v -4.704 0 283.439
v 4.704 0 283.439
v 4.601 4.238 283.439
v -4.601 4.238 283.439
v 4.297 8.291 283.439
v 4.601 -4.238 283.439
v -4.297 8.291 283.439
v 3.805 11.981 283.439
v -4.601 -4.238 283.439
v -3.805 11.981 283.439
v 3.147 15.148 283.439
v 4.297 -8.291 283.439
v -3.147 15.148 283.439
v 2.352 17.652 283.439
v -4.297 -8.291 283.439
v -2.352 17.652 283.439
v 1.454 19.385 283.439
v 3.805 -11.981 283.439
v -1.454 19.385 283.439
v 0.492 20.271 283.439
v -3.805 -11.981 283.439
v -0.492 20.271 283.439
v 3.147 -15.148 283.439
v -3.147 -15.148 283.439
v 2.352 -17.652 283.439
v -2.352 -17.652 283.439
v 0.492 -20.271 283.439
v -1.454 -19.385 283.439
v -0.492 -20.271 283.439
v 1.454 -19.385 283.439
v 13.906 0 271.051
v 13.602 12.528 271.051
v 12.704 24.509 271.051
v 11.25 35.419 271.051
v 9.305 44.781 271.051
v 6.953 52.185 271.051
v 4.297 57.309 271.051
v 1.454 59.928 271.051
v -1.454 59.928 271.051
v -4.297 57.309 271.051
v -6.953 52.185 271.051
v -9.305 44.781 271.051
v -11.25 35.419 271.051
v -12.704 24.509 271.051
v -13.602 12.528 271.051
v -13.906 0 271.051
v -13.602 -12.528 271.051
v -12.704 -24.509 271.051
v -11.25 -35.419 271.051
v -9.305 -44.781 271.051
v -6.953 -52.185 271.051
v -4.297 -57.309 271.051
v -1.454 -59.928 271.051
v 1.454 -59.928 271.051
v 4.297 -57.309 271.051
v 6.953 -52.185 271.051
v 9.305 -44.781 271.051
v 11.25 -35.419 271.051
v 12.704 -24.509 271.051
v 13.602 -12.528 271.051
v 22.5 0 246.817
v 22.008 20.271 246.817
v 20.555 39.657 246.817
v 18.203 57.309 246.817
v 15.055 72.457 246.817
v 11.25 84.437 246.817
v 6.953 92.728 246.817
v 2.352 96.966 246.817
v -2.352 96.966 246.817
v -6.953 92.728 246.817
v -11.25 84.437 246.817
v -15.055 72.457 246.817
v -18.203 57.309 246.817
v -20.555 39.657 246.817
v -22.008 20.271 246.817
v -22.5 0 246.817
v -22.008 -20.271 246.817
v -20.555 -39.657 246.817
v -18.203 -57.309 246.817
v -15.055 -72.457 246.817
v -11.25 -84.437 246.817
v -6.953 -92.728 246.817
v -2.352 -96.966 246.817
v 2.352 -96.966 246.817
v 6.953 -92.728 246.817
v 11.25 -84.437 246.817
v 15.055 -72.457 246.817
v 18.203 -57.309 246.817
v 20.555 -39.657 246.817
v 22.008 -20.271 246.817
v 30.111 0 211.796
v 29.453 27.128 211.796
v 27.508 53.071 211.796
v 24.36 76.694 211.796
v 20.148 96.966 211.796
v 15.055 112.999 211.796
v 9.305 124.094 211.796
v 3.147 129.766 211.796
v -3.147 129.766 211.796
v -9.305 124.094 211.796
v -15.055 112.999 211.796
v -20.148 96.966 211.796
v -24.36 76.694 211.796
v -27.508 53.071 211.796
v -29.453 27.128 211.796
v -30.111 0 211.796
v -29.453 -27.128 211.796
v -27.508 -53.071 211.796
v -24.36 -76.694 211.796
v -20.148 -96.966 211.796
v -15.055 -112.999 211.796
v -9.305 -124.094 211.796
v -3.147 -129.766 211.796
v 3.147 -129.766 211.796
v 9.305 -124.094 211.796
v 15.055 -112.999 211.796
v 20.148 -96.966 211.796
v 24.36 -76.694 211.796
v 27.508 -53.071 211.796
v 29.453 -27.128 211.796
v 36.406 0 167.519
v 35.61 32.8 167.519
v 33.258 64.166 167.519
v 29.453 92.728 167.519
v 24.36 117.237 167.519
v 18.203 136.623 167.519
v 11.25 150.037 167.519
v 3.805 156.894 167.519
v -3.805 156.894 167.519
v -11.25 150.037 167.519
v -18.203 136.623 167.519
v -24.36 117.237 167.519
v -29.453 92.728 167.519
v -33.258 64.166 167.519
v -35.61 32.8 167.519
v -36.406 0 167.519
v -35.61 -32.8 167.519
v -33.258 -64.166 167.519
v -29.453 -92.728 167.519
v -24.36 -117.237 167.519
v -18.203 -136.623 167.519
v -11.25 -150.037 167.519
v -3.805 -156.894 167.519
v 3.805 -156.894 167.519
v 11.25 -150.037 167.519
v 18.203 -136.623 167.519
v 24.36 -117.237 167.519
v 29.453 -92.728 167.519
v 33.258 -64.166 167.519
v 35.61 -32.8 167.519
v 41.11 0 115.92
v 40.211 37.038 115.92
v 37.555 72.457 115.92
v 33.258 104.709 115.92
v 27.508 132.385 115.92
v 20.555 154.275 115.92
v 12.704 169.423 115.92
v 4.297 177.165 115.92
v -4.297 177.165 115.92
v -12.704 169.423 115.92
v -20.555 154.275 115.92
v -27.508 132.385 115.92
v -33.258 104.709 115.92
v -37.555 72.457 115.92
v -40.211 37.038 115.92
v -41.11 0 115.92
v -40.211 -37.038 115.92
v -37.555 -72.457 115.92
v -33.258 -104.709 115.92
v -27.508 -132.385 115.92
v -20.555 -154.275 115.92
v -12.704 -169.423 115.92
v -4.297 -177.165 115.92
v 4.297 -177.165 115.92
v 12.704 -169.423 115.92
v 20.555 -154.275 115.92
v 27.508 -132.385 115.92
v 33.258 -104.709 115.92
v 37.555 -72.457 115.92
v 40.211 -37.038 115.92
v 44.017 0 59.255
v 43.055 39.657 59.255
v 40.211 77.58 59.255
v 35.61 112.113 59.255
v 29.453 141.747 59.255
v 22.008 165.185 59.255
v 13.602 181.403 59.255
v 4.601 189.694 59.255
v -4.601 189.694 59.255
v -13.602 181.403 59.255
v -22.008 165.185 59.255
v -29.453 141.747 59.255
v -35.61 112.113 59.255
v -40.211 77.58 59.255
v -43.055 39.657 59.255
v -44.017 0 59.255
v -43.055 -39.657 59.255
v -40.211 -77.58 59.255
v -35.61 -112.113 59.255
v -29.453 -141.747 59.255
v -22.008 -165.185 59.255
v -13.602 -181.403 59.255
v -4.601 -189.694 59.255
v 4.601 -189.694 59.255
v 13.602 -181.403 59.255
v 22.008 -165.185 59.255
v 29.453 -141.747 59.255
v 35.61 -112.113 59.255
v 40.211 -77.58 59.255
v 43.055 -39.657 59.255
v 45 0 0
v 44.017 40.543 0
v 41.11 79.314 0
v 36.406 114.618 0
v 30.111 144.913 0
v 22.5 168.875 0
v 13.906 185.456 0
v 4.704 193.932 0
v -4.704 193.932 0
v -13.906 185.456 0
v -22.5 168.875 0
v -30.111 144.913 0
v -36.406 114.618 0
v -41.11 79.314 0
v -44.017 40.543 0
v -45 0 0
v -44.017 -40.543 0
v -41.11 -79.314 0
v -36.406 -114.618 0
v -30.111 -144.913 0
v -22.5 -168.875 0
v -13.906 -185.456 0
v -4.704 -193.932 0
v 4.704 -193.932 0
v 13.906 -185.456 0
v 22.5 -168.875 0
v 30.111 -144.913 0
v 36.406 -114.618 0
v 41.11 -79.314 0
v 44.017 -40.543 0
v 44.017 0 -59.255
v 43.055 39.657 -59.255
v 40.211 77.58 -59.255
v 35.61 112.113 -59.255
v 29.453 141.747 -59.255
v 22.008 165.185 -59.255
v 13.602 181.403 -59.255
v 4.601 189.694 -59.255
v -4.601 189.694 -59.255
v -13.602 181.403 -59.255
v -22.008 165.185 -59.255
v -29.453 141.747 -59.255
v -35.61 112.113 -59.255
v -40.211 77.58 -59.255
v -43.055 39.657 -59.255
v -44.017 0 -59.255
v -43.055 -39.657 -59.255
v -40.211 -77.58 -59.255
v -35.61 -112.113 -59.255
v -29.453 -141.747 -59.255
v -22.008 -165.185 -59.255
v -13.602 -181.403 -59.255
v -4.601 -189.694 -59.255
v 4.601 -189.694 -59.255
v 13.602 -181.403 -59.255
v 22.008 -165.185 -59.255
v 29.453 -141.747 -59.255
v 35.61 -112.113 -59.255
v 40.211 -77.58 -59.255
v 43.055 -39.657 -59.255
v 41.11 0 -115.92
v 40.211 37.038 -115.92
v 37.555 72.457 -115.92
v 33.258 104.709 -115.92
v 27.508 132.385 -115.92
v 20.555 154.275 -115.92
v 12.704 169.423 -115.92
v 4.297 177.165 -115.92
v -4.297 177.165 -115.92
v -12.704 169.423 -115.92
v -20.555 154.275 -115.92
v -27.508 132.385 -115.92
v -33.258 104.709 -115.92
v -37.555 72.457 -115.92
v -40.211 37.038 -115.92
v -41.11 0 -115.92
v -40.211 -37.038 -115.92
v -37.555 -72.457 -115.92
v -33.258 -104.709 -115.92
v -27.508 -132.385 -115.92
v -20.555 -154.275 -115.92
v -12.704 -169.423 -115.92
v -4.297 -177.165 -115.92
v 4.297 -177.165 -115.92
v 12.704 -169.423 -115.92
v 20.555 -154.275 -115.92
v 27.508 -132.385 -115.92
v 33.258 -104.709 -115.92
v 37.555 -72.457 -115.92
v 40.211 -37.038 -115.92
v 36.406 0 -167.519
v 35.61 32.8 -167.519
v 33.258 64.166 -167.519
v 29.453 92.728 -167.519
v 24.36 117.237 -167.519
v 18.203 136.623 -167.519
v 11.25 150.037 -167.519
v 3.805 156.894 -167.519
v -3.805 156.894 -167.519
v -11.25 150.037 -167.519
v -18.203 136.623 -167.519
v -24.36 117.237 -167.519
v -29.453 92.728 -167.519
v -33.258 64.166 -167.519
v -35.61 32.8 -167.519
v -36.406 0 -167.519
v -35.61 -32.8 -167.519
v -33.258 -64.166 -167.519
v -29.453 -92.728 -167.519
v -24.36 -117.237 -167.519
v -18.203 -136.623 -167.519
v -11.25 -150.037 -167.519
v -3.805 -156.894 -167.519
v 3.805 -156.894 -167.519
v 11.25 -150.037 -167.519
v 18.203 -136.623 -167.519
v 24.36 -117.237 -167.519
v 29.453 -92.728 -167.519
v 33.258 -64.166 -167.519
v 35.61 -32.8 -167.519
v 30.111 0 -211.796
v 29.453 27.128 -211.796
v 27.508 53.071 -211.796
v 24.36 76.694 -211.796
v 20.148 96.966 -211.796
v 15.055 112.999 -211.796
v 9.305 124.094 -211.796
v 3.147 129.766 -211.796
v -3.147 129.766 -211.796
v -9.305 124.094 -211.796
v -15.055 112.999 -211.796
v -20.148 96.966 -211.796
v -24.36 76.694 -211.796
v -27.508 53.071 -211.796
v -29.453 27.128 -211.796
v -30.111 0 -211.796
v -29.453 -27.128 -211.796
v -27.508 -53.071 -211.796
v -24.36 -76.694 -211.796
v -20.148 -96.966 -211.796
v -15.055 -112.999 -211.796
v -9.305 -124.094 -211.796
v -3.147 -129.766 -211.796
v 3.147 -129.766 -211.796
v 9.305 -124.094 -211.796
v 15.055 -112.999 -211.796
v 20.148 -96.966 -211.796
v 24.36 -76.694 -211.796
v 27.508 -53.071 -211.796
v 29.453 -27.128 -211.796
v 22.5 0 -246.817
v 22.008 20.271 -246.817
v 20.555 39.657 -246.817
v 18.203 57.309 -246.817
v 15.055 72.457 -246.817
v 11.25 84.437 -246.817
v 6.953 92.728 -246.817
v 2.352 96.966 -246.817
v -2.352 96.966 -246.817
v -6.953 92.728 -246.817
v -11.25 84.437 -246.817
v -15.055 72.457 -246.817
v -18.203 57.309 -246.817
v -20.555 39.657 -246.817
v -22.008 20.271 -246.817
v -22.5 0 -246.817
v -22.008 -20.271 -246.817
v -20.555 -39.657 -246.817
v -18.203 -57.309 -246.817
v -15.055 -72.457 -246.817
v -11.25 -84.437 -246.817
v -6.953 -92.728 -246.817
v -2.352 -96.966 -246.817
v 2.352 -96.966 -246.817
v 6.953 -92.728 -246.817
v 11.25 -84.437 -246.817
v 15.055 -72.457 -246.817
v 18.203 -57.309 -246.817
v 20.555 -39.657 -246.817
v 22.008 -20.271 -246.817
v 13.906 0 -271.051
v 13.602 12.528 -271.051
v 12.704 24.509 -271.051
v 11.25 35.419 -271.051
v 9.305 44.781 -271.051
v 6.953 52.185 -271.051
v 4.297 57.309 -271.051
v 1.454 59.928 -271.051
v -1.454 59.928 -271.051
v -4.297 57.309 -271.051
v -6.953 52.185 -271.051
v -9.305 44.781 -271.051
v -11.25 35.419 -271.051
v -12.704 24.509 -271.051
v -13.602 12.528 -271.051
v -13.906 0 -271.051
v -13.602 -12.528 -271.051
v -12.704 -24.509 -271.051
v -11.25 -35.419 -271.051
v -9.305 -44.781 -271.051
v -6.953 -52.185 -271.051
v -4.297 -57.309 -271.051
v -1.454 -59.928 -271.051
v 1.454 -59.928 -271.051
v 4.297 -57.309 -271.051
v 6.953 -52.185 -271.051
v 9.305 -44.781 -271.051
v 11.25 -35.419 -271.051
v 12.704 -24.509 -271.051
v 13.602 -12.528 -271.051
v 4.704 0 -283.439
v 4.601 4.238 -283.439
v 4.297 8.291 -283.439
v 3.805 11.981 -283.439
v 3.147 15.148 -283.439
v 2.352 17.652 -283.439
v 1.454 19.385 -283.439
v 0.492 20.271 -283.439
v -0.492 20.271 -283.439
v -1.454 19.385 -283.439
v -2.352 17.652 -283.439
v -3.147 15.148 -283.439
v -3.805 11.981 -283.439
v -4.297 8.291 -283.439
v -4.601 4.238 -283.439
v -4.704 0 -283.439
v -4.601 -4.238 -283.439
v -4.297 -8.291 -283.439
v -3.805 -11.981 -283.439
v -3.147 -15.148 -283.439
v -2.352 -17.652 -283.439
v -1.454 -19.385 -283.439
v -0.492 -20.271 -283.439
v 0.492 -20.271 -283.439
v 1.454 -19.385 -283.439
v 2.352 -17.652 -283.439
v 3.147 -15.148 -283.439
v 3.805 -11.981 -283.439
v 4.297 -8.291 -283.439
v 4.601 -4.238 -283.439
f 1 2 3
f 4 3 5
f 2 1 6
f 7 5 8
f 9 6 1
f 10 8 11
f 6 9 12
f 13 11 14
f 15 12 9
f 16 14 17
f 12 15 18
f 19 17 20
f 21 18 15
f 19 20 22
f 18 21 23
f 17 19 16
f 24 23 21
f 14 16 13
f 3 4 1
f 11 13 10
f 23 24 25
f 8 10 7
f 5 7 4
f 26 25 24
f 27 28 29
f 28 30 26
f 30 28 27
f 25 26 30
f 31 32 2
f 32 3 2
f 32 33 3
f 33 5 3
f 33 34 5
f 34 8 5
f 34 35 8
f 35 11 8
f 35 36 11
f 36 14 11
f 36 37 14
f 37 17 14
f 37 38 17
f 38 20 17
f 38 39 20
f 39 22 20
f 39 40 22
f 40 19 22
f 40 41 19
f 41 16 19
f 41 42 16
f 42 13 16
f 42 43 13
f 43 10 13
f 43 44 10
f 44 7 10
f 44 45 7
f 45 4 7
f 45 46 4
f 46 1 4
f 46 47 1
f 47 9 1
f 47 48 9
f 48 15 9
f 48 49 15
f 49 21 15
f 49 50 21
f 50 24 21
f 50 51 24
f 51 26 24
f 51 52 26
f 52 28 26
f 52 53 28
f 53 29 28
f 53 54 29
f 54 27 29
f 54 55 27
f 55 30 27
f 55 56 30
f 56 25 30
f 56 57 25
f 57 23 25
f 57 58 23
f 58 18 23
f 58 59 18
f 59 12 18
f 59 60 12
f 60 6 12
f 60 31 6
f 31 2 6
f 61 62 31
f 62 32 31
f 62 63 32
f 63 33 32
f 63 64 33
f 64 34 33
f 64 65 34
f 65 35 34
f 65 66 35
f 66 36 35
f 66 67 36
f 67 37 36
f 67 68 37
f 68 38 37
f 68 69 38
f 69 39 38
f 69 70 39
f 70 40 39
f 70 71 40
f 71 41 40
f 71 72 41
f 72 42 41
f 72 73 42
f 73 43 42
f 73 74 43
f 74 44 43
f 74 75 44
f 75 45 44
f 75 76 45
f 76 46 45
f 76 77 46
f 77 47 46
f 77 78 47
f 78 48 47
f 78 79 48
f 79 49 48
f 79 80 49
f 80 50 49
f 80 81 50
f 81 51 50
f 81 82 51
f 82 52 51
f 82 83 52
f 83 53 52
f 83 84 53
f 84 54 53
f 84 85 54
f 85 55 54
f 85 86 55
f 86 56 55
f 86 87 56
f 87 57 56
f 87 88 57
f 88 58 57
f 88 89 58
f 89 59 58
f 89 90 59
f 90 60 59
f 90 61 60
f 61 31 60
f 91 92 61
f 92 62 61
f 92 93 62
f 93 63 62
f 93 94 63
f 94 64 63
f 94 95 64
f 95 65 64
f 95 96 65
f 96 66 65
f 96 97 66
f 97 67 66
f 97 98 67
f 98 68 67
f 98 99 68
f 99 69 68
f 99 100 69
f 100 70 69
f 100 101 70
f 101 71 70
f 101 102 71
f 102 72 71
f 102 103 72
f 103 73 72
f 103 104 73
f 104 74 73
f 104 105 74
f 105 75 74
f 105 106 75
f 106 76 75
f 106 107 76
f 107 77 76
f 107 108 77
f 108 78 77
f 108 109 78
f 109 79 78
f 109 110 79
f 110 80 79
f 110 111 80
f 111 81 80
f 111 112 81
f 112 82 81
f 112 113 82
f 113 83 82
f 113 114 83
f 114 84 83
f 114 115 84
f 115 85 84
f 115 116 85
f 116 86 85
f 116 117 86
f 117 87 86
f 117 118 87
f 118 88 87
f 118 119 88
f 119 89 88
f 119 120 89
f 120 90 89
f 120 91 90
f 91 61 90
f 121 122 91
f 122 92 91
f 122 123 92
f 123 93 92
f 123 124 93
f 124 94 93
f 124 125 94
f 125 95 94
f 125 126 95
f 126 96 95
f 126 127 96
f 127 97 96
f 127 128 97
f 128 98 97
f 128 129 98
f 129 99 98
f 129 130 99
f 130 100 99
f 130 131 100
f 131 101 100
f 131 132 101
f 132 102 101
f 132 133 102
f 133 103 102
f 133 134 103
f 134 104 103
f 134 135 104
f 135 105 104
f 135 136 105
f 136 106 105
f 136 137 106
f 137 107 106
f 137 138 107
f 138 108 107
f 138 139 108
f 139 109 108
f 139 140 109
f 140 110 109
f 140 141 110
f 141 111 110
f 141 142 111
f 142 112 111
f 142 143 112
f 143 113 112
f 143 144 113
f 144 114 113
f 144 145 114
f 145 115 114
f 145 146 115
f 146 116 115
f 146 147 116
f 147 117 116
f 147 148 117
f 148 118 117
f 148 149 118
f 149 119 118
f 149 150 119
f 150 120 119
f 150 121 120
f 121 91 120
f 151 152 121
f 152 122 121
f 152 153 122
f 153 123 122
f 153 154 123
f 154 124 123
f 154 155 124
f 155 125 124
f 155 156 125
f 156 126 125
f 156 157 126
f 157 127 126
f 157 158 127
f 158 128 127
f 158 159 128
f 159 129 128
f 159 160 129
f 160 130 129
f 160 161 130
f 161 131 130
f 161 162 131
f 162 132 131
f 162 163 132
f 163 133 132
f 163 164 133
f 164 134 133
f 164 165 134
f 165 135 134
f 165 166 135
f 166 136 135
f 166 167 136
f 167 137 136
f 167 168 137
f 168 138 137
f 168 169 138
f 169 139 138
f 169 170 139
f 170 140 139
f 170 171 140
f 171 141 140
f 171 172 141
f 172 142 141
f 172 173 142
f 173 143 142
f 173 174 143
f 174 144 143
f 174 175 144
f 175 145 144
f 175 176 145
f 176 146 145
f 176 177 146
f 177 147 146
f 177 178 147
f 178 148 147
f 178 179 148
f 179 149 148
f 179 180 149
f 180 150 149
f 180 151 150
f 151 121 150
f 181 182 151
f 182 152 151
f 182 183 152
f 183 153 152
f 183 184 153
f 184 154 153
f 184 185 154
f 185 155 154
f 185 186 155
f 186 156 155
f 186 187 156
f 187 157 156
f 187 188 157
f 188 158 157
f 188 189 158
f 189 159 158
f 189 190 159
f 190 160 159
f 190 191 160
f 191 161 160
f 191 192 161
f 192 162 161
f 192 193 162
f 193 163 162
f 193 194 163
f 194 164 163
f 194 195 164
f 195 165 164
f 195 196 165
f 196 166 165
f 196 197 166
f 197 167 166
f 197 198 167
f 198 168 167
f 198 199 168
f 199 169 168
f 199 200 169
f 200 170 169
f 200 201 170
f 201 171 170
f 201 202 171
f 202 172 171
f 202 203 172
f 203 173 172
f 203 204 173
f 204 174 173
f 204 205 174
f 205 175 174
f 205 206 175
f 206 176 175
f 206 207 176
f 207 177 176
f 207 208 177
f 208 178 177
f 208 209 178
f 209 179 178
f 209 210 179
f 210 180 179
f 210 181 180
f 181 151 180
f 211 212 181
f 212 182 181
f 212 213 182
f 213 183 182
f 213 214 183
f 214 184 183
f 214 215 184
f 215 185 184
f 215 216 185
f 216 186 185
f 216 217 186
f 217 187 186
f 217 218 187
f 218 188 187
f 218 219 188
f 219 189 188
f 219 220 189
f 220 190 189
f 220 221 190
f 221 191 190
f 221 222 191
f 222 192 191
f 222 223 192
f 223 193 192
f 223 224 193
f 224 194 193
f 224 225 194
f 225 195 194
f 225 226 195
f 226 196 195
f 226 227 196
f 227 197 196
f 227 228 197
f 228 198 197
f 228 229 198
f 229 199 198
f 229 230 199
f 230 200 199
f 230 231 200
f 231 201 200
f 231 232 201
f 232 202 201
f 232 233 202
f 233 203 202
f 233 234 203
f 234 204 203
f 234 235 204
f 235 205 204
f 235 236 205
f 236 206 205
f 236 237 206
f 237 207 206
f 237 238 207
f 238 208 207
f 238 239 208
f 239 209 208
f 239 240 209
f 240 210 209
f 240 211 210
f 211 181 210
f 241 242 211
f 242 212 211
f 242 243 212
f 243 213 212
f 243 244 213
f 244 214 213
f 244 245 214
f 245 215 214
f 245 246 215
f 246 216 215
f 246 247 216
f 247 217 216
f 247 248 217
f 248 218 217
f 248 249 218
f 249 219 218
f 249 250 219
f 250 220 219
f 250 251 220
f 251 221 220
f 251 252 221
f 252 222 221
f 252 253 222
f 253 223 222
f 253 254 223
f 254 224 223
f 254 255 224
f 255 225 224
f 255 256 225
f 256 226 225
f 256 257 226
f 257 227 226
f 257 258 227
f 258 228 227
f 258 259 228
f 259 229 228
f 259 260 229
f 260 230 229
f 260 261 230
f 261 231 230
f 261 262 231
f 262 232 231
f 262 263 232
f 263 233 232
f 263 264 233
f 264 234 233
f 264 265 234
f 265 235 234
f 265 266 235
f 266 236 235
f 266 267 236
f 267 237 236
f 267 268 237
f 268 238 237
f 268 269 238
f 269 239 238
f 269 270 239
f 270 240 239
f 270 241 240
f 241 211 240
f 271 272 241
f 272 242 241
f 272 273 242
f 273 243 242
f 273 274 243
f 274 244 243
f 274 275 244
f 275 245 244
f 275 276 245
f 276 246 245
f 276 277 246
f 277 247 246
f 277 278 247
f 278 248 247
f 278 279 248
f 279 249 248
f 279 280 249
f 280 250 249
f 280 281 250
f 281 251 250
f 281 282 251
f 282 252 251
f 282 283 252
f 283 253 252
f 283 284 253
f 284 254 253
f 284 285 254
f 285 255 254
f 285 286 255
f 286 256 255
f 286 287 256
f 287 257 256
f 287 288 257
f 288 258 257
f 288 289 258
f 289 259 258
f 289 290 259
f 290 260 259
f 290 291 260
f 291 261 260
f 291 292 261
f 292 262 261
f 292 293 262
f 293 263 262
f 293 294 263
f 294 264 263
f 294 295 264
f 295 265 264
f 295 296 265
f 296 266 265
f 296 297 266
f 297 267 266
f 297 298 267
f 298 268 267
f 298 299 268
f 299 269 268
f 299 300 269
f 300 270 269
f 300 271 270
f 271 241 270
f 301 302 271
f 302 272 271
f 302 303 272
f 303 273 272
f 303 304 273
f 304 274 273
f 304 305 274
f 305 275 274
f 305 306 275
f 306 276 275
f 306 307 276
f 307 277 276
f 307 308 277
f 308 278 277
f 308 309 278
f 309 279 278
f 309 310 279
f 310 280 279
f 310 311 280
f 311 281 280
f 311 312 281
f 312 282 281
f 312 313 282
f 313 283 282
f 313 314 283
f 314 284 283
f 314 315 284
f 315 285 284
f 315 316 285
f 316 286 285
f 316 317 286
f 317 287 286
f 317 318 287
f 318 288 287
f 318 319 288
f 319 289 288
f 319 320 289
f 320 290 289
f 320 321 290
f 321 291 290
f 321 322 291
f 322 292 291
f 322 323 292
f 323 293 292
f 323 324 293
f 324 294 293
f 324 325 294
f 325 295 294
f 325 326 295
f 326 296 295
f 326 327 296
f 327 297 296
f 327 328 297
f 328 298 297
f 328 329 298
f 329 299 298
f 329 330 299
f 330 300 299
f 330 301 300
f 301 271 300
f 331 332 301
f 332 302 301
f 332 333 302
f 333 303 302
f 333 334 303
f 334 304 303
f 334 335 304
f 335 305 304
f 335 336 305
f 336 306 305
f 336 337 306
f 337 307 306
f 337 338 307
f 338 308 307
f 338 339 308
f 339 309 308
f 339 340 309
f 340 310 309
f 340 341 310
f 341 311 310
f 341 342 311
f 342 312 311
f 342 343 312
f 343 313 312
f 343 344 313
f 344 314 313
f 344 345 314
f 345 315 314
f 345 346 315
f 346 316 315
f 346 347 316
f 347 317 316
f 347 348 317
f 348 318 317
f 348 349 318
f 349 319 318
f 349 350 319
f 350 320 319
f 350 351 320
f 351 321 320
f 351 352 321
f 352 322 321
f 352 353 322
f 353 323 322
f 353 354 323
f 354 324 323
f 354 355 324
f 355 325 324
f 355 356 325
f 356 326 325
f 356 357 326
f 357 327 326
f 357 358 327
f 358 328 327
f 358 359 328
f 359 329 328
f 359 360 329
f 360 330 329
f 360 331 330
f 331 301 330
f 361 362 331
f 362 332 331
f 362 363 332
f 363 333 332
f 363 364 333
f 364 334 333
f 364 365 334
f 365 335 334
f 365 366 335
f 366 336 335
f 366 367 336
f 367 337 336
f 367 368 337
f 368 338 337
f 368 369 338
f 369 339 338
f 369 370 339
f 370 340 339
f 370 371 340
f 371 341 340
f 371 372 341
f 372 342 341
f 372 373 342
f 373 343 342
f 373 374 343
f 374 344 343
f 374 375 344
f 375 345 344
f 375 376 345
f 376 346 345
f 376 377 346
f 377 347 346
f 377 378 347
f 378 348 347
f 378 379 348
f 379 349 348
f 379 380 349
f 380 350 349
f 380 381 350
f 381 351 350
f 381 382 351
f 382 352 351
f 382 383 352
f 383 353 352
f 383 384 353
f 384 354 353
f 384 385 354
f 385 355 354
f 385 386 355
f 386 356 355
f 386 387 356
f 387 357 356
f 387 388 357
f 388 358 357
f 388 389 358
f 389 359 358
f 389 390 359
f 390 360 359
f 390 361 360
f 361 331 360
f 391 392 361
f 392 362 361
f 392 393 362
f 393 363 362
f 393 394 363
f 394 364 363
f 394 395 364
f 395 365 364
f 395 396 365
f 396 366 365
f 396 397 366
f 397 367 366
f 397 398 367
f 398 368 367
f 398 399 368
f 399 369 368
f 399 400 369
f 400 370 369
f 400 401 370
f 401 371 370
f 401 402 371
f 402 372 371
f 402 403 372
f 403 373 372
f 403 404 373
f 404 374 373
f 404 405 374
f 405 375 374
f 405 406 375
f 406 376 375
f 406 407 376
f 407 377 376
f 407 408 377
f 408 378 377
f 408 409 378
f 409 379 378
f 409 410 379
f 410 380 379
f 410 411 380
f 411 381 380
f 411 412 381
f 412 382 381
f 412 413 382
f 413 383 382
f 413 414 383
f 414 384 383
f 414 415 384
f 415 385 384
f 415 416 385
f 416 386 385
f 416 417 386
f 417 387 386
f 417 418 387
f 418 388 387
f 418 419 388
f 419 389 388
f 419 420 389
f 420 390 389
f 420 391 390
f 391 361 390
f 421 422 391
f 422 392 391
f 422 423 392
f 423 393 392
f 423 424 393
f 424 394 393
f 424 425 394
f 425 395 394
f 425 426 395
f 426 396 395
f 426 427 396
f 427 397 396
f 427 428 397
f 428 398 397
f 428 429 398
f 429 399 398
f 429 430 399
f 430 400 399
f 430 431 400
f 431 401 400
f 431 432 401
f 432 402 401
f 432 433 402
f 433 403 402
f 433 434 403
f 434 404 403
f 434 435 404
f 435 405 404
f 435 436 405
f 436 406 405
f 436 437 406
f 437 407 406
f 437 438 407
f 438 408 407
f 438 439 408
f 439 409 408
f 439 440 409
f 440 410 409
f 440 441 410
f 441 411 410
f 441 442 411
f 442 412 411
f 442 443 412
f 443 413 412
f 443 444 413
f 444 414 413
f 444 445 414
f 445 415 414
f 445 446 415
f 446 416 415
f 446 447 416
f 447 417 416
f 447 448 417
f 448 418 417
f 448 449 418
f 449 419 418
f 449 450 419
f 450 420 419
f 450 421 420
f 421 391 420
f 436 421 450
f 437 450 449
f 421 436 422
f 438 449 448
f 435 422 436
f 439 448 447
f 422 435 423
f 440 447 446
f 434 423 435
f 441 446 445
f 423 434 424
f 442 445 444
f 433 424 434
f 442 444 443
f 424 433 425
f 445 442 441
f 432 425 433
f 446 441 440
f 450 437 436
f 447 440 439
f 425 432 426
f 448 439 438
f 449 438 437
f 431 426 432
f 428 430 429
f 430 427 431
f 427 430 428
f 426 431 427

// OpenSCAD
// Generated by SolidPython 1.0.1 on 2020-07-29 00:46:45


scale(v = [3, 13, 19]) {
	sphere(r = 15);
}
/***********************************************
*********      SolidPython code:      **********
************************************************
 
# import packages: SolidPython
from solid import *
from solid.utils import *
from itertools import chain, combinations, permutations


class Resize:

    def __init__(self, scad_file):
        self.scad_file = scad_file
        #self.scad_file = import_scad(scad_file)
        # cone/cylinder param:
        self.r1 = 0
        self.r2 = 0
        self.h = 0
        # rectangular prism param:
        self.w = 0
        self.l = 0
        # ellipse param:
        self.r = 0

    # import OpenScad code (file name corresponds to shape)


    # classify shape + parameters
    def assign(self, param1, param2, param3):
        if self.scad_file == 'cone.scad':
            self.r1 = param1
            self.r2 = param2
            self.h = param3
        elif self.scad_file == 'cylinder.scad':
            self.r1 = param1
            self.r2 = param2
            self.h = param3
        elif self.scad_file == 'rectangularPrism.scad':
            self.h = param1
            self.l = param2
            self.w = param3
        else:
            self.r = param1
            self.h = param2

    # resize parameters
    def iterate(self):
        x = range(3, 20, 2)
        i = 1
        if self.scad_file == 'cone.scad':
            tempList = list(permutations(x, 2))
            for temp in tempList:
                param1 = temp[0]
                param2 = temp[1]
                filepath = 'produced_scad_files/' + 'cone' + str(param1) + '_' + str(param2) + '_' + '.scad'
                scad_render_to_file(cylinder(h=param1, r1=param2, r2=0), filepath)

        elif self.scad_file == 'cylinder.scad':
            tempList = list(permutations(x, 3))
            for temp in tempList:
                param1 = temp[0]
                param2 = temp[1]
                filepath = 'produced_scad_files/' + 'cylinder' + str(param1) + '_' + str(param2) + '_' + '.scad'
                scad_render_to_file(cylinder(h=param1, r1=param2, r2=param2), filepath)

        elif self.scad_file == 'rectangularPrism.scad':
            tempList = list(permutations(x, 3))
            for temp in tempList:
                param1 = temp[0]
                param2 = temp[1]
                param3 = temp[2]
                filepath = 'produced_scad_files/' + 'rectangularPrism' + str(param1) + '_' + str(param2) + '_' + str(
                    param3) + '.scad'
                scad_render_to_file(cube(size=(param1, param2, param3)), filepath)

        elif self.scad_file == 'ellipse.scad':
            tempList = list(permutations(x, 4))
            for temp in tempList:
                param1 = temp[0]
                param2 = temp[1]
                param3 = temp[2]
                param4 = temp[3]
                filepath = 'produced_scad_files/' + 'ellipse' + str(param1) + '_' + str(param2) + '_' + str(param3) + '_' + str(param4) + '.scad'
                scad_render_to_file(scale([param1, param2, param3])(sphere(r=param4)), filepath)

    def render_to_scadfile(self):
        scad_render_to_file(scad, 'example.scad') 
 
************************************************/
